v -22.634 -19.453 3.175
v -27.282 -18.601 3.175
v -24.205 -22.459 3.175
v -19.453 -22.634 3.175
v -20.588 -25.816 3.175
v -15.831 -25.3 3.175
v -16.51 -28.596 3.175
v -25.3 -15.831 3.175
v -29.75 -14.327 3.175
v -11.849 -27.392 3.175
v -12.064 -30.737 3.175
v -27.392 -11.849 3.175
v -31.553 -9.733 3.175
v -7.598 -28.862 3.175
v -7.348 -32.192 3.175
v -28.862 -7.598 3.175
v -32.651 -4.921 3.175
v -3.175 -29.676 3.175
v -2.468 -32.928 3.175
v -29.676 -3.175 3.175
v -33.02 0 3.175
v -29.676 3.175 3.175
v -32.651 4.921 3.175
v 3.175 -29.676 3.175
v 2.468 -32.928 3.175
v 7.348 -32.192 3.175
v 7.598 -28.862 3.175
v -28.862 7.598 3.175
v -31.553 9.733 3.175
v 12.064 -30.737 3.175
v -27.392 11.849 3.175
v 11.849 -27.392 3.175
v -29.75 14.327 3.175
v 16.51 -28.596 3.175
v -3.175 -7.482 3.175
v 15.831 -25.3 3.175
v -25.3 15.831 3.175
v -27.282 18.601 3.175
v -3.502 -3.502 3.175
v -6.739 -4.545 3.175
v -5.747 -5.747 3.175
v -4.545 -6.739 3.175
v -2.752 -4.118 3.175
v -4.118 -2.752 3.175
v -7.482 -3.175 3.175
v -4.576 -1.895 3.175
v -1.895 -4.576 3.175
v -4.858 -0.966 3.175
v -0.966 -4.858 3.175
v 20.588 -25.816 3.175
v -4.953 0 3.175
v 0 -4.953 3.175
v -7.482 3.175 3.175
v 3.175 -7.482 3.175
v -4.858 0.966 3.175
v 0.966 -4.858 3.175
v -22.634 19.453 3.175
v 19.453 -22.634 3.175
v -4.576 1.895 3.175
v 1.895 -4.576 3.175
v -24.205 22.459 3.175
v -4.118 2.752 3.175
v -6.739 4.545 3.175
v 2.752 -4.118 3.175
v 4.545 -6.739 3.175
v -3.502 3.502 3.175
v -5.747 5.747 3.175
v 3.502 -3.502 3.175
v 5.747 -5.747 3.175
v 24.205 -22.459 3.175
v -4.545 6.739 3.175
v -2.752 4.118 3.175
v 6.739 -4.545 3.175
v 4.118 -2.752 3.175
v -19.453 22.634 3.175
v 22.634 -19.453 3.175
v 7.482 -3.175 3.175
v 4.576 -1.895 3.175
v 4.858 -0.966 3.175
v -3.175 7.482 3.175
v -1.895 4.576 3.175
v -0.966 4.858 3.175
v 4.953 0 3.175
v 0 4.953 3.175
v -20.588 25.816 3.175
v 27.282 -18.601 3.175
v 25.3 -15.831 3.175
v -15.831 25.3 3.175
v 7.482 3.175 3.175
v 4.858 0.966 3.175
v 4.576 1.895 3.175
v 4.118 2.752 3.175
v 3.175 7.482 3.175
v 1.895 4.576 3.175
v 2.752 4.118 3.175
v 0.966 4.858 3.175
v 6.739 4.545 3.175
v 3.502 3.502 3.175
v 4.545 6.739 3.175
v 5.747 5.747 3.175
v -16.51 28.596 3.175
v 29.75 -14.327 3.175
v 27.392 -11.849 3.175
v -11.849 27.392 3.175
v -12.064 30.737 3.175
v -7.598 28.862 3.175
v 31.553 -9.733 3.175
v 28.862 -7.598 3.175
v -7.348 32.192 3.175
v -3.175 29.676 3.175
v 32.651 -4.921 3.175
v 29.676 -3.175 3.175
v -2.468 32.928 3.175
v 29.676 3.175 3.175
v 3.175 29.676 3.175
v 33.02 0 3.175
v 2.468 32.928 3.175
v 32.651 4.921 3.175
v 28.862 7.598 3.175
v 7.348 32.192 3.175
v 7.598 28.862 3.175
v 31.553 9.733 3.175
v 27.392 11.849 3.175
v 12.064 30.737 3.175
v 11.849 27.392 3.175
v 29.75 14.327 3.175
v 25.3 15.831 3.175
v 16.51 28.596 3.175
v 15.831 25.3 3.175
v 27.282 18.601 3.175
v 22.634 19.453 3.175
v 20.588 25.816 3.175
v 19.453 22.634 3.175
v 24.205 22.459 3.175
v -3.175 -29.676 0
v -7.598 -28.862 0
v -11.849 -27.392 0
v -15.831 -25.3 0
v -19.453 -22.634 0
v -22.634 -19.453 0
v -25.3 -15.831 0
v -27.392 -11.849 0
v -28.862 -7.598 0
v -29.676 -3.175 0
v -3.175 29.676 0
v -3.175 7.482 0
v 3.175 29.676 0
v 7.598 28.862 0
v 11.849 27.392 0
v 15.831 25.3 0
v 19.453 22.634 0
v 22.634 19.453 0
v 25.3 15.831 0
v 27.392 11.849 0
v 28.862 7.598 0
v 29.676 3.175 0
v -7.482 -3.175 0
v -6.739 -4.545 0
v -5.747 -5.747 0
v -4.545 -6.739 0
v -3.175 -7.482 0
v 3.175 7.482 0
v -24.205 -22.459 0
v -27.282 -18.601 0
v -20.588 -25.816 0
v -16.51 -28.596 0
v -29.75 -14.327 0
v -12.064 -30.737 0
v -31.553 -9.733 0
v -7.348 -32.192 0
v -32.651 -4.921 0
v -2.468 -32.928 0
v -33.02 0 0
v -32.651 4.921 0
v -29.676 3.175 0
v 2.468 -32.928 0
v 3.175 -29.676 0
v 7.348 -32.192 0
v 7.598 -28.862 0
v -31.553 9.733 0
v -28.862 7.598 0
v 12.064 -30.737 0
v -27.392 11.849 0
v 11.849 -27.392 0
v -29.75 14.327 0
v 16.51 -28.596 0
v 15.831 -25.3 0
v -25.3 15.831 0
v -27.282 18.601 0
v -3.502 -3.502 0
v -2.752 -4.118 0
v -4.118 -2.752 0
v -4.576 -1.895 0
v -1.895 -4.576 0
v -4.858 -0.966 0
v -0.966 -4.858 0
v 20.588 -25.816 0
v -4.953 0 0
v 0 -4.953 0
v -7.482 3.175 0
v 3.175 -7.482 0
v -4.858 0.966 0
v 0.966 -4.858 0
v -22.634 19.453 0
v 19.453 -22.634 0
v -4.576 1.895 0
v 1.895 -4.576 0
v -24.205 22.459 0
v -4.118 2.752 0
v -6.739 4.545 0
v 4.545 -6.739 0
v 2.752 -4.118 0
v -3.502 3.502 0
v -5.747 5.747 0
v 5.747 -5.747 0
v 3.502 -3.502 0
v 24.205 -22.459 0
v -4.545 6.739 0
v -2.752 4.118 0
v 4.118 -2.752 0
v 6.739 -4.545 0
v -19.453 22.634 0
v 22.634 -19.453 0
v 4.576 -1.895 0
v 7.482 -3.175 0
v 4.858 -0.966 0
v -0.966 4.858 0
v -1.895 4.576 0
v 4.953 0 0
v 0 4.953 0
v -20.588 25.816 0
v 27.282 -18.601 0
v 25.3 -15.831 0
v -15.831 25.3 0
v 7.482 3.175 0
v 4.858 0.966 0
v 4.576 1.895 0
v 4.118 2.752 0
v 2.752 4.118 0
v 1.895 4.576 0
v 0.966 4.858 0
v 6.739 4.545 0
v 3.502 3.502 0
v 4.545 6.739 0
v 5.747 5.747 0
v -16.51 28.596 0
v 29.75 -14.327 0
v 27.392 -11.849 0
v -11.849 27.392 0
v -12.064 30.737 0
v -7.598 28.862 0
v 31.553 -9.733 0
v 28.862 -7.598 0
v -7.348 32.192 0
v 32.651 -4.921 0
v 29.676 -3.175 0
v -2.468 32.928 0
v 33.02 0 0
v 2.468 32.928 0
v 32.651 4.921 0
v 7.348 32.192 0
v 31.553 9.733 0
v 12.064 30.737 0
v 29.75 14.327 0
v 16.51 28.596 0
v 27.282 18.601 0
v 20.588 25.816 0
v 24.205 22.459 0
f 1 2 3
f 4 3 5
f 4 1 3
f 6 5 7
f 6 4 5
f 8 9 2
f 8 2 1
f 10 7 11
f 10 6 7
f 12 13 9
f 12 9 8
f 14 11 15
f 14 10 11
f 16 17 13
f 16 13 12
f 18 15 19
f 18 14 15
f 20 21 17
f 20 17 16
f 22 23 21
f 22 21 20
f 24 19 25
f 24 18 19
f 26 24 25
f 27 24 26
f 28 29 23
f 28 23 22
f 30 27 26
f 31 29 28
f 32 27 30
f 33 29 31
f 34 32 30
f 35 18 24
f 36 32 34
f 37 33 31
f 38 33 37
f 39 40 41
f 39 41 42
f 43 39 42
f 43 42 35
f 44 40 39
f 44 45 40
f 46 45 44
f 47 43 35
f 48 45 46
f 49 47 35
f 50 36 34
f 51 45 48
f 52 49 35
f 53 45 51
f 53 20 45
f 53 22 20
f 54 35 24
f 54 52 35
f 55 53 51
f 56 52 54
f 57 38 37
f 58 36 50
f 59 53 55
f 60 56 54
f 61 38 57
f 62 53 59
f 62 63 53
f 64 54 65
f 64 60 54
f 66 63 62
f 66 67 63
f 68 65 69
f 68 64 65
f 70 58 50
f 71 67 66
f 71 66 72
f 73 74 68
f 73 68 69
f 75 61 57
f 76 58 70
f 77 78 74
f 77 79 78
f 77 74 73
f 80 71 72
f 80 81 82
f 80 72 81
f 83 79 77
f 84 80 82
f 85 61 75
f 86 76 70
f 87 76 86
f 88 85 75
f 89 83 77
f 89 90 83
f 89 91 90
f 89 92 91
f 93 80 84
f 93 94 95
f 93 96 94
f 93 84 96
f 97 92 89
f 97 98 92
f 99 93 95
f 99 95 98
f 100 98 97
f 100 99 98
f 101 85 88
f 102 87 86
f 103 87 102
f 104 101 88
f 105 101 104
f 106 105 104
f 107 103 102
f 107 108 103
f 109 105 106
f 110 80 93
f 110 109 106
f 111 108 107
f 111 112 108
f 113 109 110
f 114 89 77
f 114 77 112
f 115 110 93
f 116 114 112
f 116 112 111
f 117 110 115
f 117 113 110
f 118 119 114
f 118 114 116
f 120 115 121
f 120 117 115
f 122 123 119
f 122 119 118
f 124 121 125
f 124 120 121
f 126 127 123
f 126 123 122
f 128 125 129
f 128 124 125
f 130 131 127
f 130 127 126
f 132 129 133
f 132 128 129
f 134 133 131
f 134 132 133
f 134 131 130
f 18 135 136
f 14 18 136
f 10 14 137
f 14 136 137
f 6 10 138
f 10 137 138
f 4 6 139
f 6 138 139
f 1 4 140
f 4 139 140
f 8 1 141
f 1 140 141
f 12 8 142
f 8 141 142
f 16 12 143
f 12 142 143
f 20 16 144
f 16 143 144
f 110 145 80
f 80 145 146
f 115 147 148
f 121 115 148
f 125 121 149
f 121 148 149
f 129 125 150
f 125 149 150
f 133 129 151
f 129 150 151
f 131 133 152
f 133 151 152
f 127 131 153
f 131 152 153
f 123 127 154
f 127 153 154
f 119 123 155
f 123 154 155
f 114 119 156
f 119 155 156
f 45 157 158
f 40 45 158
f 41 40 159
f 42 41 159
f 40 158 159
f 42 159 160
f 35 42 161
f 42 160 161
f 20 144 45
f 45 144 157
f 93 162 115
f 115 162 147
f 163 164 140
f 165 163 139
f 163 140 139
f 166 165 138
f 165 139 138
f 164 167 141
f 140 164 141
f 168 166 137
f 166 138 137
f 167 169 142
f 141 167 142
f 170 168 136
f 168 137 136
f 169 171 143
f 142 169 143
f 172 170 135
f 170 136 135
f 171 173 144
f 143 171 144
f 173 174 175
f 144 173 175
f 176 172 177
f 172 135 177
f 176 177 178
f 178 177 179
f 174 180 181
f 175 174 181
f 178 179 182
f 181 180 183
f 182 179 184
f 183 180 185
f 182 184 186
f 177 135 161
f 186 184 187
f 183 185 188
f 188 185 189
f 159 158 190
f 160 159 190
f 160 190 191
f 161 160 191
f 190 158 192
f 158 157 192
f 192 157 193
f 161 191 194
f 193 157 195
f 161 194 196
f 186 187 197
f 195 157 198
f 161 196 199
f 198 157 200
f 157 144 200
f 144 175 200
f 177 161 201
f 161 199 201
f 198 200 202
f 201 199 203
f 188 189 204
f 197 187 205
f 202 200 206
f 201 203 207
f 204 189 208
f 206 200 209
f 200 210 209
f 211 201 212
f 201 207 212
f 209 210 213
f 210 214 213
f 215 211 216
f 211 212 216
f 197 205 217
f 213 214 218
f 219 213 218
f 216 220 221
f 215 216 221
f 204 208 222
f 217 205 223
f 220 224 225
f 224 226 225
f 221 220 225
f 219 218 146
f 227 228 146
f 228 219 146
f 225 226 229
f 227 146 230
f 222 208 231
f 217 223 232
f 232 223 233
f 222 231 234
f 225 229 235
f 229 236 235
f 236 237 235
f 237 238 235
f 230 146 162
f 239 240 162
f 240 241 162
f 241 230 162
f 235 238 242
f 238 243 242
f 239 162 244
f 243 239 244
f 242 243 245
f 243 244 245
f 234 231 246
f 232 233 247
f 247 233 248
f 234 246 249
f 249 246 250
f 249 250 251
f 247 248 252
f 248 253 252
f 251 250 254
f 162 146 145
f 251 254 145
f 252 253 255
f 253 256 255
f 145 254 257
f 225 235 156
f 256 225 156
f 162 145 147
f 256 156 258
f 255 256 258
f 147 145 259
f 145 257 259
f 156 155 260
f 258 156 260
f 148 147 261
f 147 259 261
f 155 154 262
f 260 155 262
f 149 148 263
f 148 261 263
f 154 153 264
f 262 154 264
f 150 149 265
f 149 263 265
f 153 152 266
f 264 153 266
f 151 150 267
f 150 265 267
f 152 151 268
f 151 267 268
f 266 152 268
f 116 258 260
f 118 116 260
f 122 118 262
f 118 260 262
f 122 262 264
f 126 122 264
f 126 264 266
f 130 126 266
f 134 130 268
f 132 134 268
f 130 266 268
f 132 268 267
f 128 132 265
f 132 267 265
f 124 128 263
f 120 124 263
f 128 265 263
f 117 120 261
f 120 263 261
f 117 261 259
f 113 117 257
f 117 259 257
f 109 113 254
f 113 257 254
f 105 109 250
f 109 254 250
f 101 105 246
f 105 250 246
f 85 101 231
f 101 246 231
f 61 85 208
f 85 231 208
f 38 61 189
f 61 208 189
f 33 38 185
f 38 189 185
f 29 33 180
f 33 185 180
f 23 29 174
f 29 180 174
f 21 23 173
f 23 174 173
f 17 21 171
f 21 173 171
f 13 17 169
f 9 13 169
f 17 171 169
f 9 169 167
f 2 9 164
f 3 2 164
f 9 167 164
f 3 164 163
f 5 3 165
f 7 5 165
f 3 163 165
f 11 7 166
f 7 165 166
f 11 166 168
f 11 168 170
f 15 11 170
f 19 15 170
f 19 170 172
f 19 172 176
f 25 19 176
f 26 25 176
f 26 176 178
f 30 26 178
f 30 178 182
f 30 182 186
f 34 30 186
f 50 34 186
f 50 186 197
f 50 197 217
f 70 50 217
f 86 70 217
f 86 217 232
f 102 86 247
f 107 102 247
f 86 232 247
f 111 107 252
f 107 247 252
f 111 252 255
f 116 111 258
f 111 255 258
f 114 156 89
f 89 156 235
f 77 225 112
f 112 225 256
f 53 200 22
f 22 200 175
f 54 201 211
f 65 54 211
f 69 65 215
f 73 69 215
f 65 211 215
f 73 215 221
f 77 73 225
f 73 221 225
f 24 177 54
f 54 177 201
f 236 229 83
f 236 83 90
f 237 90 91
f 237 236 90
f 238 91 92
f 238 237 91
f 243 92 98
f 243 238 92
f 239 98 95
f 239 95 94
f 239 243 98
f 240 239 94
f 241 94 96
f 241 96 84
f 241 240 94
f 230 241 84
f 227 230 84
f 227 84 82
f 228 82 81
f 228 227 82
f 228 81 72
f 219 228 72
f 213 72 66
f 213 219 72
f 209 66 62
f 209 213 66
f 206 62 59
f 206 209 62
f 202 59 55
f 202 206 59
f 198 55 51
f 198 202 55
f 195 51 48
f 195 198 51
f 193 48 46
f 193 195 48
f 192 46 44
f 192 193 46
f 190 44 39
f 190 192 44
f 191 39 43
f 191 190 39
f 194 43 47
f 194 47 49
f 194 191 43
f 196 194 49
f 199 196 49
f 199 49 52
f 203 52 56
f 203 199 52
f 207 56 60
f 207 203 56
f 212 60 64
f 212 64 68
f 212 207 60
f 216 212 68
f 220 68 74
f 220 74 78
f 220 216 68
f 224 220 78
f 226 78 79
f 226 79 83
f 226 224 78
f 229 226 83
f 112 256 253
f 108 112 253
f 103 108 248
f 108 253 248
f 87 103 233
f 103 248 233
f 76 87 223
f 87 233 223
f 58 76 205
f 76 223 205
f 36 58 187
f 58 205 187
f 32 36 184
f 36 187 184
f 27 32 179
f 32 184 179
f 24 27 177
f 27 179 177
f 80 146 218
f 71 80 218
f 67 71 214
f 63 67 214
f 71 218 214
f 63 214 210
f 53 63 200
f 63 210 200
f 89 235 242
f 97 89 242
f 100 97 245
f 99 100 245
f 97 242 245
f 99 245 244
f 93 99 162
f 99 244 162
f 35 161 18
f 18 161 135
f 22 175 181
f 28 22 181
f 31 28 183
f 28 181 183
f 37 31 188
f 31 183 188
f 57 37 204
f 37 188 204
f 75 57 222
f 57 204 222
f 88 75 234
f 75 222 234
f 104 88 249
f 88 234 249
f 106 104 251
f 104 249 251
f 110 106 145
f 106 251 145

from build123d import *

# Parameters (mm, degrees)
SKETCH1_R           = 33.02
SKETCH1_R_2         = 4.953
BOSS_EXTRUDE1_DEPTH = 3.175


with BuildPart() as part:
    # Sketch1 → Boss-Extrude1 (new body)
    with BuildSketch(Plane.XY):
        Circle(SKETCH1_R)
        Circle(SKETCH1_R_2, mode=Mode.SUBTRACT)
        with BuildLine():
            Line((-7.482229547, 3.175), (-29.675636472, 3.175))
            ThreePointArc((-29.675636472, 3.175), (-21.103601885, 21.103601885), (-3.175, 29.675636472))
            Line((-3.175, 29.675636472), (-3.175, 7.482229547))
            ThreePointArc((-3.175, 7.482229547), (-5.747363917, 5.747363917), (-7.482229547, 3.175))
        make_face(mode=Mode.SUBTRACT)
        with BuildLine():
            Line((3.175, 7.482229547), (3.175, 29.675636472))
            ThreePointArc((3.175, 29.675636472), (21.103601885, 21.103601885), (29.675636472, 3.175))
            Line((29.675636472, 3.175), (7.482229547, 3.175))
            ThreePointArc((7.482229547, 3.175), (5.747363917, 5.747363917), (3.175, 7.482229547))
        make_face(mode=Mode.SUBTRACT)
        with BuildLine():
            Line((7.482229547, -3.175), (29.675636472, -3.175))
            ThreePointArc((29.675636472, -3.175), (21.103601885, -21.103601885), (3.175, -29.675636472))
            Line((3.175, -29.675636472), (3.175, -7.482229547))
            ThreePointArc((3.175, -7.482229547), (5.747363917, -5.747363917), (7.482229547, -3.175))
        make_face(mode=Mode.SUBTRACT)
        with BuildLine():
            Line((-3.175, -7.482229547), (-3.175, -29.675636472))
            ThreePointArc((-3.175, -29.675636472), (-21.103601885, -21.103601885), (-29.675636472, -3.175))
            Line((-29.675636472, -3.175), (-7.482229547, -3.175))
            ThreePointArc((-7.482229547, -3.175), (-5.747363917, -5.747363917), (-3.175, -7.482229547))
        make_face(mode=Mode.SUBTRACT)
    extrude(amount=BOSS_EXTRUDE1_DEPTH)


solid = part.part
